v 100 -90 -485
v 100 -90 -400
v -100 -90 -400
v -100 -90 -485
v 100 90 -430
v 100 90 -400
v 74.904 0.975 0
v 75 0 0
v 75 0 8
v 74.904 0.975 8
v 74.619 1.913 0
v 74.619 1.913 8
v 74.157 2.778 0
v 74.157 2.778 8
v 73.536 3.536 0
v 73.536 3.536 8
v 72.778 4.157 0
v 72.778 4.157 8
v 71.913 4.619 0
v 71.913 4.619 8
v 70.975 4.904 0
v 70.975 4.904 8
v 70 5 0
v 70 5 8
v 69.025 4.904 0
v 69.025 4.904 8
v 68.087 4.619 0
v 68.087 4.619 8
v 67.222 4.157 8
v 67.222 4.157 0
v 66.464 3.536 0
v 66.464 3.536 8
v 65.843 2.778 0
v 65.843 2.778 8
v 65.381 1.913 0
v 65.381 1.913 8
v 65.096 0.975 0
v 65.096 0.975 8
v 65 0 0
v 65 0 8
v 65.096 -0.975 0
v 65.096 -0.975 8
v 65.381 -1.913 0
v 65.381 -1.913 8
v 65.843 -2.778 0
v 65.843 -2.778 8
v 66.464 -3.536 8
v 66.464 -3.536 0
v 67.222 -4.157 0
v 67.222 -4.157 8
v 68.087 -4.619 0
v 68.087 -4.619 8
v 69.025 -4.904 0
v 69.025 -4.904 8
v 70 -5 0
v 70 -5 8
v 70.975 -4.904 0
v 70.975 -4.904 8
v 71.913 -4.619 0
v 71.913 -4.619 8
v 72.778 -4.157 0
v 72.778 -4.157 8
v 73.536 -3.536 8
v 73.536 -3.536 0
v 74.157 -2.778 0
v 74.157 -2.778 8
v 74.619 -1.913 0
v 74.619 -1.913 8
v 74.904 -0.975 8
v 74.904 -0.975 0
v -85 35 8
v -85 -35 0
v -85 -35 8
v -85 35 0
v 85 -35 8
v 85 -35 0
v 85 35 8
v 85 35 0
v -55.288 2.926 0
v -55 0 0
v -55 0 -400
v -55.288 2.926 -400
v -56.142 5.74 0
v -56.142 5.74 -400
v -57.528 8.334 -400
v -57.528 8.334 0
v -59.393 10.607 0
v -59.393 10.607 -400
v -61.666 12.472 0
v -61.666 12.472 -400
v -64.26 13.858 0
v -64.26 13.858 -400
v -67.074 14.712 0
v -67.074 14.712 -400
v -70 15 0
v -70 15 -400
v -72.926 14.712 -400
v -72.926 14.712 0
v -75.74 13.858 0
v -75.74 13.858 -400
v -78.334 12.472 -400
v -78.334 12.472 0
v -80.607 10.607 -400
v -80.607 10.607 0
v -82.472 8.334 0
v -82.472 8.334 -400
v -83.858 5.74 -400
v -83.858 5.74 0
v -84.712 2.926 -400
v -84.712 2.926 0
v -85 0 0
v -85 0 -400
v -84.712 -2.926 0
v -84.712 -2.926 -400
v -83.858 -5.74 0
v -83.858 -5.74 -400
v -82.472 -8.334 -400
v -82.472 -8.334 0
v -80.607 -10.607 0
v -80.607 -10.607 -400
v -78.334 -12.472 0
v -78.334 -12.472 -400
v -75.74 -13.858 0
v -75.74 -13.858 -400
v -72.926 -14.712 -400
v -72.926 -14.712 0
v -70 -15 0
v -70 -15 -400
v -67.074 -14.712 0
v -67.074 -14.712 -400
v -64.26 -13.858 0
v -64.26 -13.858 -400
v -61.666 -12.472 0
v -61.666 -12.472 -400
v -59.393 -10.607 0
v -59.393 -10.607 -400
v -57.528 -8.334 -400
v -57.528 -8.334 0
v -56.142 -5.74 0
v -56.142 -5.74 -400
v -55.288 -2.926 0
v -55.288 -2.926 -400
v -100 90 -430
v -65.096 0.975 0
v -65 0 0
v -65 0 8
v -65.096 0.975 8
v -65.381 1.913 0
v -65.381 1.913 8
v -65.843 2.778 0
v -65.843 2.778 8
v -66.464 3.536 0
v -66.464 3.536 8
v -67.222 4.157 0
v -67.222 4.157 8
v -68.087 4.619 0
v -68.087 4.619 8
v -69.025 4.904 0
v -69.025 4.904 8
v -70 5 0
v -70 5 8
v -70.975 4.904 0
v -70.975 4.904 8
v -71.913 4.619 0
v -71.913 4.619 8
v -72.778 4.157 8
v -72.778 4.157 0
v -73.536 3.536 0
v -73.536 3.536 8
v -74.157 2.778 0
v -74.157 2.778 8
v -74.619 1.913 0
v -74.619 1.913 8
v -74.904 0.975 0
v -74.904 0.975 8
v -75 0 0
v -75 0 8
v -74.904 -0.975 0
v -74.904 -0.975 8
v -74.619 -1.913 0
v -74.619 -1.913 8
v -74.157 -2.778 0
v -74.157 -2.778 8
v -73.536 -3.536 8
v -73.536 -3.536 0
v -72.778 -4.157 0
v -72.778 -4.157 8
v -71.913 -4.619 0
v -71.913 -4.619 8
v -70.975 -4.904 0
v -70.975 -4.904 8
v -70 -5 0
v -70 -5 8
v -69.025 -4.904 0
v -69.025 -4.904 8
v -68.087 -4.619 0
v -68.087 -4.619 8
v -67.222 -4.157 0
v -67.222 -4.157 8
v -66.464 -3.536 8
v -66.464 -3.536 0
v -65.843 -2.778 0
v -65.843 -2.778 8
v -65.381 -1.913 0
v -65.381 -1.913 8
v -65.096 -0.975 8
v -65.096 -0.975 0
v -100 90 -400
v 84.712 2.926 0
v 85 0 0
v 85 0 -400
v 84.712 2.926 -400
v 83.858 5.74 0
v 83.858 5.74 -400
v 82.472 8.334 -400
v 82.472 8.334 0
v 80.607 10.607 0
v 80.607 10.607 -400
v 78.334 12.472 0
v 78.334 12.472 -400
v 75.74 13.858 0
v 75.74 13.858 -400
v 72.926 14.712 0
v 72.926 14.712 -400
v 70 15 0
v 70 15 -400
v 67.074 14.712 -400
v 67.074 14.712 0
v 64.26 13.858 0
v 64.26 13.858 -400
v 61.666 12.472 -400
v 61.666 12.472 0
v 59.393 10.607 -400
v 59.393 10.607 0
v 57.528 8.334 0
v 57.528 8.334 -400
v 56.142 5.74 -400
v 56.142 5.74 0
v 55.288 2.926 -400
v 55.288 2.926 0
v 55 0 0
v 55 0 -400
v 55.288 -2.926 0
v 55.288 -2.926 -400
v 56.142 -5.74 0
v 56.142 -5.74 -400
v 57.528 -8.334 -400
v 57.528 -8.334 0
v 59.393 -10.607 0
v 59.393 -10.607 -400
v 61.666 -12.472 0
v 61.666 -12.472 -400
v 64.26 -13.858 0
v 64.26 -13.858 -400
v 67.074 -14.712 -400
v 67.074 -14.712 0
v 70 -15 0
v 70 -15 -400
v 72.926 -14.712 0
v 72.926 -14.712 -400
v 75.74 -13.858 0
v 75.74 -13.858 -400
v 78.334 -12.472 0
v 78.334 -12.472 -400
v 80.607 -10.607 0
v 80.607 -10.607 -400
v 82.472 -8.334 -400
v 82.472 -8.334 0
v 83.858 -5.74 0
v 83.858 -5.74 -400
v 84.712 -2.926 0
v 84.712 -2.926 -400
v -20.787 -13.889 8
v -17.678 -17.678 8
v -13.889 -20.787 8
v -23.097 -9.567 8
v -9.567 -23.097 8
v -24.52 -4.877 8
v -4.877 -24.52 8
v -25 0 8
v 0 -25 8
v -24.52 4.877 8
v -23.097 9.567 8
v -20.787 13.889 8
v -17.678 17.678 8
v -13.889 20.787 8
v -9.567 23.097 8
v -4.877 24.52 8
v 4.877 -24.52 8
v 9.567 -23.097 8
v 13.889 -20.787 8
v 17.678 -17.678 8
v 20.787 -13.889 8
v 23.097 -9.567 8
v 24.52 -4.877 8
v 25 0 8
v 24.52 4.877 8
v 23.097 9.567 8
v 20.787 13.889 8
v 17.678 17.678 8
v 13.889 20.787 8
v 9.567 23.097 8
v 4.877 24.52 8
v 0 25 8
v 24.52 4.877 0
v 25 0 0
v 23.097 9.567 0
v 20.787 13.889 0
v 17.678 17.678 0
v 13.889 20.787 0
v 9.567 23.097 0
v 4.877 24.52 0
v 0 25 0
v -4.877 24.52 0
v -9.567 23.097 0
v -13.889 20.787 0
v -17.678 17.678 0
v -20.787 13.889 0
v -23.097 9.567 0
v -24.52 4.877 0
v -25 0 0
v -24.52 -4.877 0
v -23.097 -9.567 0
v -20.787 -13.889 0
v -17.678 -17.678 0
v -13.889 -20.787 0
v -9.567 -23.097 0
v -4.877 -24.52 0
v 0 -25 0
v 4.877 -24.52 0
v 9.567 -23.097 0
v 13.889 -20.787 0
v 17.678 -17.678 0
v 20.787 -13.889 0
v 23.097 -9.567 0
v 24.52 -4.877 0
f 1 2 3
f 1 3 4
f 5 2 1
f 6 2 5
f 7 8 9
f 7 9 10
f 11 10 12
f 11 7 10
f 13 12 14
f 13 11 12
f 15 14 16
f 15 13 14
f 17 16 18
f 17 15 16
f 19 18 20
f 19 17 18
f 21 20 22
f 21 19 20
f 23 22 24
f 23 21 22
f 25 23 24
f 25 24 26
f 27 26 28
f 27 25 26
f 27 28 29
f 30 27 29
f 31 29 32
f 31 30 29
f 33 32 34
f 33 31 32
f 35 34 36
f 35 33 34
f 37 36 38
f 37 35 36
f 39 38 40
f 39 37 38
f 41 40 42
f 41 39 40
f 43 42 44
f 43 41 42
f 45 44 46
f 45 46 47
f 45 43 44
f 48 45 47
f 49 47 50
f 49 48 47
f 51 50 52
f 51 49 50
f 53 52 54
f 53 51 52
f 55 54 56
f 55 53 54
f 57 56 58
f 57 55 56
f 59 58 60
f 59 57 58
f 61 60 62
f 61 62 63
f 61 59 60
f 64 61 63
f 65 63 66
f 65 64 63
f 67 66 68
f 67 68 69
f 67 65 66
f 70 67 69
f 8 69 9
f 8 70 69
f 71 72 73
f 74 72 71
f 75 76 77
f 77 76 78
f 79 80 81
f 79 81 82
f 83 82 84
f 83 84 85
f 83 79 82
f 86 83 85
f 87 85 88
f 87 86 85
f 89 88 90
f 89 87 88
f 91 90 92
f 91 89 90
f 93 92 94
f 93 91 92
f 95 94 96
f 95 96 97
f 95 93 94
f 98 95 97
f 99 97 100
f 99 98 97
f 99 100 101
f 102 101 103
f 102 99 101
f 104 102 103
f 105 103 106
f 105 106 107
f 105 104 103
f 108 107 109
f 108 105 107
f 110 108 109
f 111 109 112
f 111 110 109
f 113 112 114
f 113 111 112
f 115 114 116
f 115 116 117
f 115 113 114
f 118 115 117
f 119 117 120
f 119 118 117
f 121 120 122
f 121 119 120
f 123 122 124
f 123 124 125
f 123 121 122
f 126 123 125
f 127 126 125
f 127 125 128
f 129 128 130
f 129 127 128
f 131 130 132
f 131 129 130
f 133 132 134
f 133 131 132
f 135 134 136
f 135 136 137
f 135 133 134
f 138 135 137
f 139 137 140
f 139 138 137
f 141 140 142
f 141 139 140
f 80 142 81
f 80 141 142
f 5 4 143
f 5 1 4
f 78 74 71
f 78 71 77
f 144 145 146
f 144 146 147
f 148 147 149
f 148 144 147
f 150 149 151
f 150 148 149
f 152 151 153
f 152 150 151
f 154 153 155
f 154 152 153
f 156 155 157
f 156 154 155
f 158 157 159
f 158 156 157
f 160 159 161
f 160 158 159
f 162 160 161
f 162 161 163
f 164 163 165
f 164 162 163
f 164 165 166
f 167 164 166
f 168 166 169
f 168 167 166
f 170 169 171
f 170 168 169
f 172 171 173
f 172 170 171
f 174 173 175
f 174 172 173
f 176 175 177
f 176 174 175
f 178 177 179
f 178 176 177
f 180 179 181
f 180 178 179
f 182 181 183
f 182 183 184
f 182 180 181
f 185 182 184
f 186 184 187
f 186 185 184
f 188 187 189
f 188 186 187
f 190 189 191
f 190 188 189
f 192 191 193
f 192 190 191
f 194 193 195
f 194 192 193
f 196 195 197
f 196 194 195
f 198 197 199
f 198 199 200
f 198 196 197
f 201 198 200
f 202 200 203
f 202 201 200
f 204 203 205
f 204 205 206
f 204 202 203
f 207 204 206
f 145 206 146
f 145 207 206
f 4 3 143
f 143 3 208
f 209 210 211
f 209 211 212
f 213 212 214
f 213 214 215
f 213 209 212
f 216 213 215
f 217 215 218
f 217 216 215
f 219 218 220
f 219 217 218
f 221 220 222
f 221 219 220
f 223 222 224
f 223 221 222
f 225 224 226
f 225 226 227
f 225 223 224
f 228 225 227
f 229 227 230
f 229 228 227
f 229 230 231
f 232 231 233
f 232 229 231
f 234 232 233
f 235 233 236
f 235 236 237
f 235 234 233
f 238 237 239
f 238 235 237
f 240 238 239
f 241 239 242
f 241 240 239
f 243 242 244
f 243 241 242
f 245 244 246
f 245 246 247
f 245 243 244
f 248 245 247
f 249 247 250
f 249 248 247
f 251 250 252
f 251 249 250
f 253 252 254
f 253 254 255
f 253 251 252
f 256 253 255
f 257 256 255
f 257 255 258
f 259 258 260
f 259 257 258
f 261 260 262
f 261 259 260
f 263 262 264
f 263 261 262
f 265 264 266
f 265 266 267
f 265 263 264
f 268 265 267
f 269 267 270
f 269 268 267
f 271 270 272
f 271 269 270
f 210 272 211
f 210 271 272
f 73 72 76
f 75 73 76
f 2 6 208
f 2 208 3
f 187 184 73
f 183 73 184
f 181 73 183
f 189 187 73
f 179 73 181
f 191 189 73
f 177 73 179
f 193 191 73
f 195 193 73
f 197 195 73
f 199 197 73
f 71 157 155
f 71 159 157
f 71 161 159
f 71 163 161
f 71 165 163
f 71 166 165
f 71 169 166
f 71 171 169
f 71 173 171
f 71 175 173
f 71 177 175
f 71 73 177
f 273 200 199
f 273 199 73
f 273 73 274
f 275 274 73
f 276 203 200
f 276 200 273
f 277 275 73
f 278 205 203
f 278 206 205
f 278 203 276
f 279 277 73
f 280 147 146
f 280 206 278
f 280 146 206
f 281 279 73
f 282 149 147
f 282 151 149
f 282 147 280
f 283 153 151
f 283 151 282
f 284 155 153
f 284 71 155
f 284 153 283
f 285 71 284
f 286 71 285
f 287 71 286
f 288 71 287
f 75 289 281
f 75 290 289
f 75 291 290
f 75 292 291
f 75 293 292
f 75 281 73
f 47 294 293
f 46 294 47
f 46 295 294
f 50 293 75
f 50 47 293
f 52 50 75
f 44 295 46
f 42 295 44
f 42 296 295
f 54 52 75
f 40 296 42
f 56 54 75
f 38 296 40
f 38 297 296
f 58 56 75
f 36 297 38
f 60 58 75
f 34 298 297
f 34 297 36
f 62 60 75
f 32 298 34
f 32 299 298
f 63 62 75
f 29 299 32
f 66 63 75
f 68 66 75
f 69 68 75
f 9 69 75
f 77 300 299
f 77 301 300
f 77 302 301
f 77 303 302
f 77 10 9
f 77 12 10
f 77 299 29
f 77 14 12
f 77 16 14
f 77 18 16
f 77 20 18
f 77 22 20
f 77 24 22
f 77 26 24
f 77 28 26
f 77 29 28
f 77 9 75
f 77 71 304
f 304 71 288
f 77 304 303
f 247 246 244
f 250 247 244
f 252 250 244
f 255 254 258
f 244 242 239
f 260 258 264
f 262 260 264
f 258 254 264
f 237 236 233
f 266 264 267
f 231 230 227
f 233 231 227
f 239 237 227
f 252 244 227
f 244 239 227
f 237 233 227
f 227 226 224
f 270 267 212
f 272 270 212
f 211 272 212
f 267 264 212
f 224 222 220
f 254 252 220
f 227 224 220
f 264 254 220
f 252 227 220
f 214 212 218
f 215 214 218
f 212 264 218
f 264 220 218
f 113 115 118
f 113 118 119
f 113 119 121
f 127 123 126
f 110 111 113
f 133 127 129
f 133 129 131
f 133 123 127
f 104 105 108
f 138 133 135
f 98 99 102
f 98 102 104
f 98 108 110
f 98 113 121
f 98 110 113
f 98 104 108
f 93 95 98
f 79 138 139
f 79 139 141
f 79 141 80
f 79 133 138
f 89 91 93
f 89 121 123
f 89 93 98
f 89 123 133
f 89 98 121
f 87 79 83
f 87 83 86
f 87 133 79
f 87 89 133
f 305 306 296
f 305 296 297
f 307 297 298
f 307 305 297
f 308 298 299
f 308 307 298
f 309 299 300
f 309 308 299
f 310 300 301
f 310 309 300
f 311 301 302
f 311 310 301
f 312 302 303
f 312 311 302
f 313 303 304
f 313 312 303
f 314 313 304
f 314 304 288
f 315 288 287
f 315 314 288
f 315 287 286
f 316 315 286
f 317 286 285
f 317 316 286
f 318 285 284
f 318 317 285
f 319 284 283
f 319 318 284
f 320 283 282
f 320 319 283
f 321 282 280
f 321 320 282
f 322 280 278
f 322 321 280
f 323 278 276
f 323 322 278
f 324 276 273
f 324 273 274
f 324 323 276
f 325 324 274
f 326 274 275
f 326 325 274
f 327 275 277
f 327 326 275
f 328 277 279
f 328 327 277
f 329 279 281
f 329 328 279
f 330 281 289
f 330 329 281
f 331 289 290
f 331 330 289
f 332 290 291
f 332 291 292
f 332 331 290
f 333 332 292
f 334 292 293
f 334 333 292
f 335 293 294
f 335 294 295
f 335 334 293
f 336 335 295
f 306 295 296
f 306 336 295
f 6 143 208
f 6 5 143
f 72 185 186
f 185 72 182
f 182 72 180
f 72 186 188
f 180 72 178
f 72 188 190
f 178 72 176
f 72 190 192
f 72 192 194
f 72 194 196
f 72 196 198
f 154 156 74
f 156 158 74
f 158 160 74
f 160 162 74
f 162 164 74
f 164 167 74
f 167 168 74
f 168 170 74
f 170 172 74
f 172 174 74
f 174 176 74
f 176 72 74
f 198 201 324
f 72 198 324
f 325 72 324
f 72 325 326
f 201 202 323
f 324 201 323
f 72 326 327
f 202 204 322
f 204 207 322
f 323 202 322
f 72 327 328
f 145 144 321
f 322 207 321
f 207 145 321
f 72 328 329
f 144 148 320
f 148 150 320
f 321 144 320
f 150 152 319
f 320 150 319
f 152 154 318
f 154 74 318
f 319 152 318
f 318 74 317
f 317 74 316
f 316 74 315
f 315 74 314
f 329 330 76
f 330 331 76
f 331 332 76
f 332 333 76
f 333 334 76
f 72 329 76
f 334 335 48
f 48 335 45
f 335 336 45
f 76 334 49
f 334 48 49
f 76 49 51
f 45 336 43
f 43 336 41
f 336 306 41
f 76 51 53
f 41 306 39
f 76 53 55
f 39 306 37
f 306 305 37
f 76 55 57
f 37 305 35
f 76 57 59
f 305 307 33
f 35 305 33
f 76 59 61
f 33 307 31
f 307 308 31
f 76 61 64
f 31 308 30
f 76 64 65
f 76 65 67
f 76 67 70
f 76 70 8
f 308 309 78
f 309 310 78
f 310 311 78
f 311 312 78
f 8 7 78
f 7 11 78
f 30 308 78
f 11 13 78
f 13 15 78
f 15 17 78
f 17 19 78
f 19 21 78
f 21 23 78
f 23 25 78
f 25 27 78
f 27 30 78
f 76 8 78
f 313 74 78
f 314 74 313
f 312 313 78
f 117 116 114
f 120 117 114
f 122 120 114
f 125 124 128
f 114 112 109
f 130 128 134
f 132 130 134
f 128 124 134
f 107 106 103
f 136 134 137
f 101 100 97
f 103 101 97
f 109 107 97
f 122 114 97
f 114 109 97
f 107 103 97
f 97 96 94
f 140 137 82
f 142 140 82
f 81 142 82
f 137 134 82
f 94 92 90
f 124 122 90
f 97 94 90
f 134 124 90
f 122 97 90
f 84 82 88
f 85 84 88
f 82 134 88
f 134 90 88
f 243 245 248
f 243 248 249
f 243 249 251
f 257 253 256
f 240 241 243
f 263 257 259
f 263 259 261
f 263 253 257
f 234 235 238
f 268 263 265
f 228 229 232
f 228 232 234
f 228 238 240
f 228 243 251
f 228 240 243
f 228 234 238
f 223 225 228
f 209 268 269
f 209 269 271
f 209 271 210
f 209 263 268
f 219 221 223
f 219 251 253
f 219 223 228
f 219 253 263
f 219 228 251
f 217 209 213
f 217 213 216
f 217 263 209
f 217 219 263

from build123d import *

# Parameters (mm, degrees)
F0_W     = 170
F0_H     = 70
F0_R     = 5
F0_R_2   = 25
F1_DEPTH = 8
F2_R     = 15
F3_DEPTH = 400
F5_DEPTH = 100


with BuildPart() as f1:
    # F0 (on Top) → F1 (new body)
    with BuildSketch(Plane.XY):
        Rectangle(F0_W, F0_H)
        with Locations((-70, 0)):
            Circle(F0_R, mode=Mode.SUBTRACT)
        Circle(F0_R_2, mode=Mode.SUBTRACT)
        with Locations((70, 0)):
            Circle(F0_R, mode=Mode.SUBTRACT)
    extrude(amount=F1_DEPTH)


with BuildPart() as f3:
    # F2 (on Top) → F3 (new body)
    with BuildSketch(Plane.XY):
        with Locations((-70, 0)):
            Circle(F2_R)
        with Locations((70, 0)):
            Circle(F2_R)
    extrude(amount=-F3_DEPTH)


with BuildPart() as f5:
    # F4 (on Right) → F5 (new body, symmetric)
    with BuildSketch(Plane.YZ):
        Polygon((90, -430), (90, -400), (-90, -400), (-90, -485), align=None)
    extrude(amount=F5_DEPTH, both=True)


solid = Compound([f1.part, f3.part, f5.part])
